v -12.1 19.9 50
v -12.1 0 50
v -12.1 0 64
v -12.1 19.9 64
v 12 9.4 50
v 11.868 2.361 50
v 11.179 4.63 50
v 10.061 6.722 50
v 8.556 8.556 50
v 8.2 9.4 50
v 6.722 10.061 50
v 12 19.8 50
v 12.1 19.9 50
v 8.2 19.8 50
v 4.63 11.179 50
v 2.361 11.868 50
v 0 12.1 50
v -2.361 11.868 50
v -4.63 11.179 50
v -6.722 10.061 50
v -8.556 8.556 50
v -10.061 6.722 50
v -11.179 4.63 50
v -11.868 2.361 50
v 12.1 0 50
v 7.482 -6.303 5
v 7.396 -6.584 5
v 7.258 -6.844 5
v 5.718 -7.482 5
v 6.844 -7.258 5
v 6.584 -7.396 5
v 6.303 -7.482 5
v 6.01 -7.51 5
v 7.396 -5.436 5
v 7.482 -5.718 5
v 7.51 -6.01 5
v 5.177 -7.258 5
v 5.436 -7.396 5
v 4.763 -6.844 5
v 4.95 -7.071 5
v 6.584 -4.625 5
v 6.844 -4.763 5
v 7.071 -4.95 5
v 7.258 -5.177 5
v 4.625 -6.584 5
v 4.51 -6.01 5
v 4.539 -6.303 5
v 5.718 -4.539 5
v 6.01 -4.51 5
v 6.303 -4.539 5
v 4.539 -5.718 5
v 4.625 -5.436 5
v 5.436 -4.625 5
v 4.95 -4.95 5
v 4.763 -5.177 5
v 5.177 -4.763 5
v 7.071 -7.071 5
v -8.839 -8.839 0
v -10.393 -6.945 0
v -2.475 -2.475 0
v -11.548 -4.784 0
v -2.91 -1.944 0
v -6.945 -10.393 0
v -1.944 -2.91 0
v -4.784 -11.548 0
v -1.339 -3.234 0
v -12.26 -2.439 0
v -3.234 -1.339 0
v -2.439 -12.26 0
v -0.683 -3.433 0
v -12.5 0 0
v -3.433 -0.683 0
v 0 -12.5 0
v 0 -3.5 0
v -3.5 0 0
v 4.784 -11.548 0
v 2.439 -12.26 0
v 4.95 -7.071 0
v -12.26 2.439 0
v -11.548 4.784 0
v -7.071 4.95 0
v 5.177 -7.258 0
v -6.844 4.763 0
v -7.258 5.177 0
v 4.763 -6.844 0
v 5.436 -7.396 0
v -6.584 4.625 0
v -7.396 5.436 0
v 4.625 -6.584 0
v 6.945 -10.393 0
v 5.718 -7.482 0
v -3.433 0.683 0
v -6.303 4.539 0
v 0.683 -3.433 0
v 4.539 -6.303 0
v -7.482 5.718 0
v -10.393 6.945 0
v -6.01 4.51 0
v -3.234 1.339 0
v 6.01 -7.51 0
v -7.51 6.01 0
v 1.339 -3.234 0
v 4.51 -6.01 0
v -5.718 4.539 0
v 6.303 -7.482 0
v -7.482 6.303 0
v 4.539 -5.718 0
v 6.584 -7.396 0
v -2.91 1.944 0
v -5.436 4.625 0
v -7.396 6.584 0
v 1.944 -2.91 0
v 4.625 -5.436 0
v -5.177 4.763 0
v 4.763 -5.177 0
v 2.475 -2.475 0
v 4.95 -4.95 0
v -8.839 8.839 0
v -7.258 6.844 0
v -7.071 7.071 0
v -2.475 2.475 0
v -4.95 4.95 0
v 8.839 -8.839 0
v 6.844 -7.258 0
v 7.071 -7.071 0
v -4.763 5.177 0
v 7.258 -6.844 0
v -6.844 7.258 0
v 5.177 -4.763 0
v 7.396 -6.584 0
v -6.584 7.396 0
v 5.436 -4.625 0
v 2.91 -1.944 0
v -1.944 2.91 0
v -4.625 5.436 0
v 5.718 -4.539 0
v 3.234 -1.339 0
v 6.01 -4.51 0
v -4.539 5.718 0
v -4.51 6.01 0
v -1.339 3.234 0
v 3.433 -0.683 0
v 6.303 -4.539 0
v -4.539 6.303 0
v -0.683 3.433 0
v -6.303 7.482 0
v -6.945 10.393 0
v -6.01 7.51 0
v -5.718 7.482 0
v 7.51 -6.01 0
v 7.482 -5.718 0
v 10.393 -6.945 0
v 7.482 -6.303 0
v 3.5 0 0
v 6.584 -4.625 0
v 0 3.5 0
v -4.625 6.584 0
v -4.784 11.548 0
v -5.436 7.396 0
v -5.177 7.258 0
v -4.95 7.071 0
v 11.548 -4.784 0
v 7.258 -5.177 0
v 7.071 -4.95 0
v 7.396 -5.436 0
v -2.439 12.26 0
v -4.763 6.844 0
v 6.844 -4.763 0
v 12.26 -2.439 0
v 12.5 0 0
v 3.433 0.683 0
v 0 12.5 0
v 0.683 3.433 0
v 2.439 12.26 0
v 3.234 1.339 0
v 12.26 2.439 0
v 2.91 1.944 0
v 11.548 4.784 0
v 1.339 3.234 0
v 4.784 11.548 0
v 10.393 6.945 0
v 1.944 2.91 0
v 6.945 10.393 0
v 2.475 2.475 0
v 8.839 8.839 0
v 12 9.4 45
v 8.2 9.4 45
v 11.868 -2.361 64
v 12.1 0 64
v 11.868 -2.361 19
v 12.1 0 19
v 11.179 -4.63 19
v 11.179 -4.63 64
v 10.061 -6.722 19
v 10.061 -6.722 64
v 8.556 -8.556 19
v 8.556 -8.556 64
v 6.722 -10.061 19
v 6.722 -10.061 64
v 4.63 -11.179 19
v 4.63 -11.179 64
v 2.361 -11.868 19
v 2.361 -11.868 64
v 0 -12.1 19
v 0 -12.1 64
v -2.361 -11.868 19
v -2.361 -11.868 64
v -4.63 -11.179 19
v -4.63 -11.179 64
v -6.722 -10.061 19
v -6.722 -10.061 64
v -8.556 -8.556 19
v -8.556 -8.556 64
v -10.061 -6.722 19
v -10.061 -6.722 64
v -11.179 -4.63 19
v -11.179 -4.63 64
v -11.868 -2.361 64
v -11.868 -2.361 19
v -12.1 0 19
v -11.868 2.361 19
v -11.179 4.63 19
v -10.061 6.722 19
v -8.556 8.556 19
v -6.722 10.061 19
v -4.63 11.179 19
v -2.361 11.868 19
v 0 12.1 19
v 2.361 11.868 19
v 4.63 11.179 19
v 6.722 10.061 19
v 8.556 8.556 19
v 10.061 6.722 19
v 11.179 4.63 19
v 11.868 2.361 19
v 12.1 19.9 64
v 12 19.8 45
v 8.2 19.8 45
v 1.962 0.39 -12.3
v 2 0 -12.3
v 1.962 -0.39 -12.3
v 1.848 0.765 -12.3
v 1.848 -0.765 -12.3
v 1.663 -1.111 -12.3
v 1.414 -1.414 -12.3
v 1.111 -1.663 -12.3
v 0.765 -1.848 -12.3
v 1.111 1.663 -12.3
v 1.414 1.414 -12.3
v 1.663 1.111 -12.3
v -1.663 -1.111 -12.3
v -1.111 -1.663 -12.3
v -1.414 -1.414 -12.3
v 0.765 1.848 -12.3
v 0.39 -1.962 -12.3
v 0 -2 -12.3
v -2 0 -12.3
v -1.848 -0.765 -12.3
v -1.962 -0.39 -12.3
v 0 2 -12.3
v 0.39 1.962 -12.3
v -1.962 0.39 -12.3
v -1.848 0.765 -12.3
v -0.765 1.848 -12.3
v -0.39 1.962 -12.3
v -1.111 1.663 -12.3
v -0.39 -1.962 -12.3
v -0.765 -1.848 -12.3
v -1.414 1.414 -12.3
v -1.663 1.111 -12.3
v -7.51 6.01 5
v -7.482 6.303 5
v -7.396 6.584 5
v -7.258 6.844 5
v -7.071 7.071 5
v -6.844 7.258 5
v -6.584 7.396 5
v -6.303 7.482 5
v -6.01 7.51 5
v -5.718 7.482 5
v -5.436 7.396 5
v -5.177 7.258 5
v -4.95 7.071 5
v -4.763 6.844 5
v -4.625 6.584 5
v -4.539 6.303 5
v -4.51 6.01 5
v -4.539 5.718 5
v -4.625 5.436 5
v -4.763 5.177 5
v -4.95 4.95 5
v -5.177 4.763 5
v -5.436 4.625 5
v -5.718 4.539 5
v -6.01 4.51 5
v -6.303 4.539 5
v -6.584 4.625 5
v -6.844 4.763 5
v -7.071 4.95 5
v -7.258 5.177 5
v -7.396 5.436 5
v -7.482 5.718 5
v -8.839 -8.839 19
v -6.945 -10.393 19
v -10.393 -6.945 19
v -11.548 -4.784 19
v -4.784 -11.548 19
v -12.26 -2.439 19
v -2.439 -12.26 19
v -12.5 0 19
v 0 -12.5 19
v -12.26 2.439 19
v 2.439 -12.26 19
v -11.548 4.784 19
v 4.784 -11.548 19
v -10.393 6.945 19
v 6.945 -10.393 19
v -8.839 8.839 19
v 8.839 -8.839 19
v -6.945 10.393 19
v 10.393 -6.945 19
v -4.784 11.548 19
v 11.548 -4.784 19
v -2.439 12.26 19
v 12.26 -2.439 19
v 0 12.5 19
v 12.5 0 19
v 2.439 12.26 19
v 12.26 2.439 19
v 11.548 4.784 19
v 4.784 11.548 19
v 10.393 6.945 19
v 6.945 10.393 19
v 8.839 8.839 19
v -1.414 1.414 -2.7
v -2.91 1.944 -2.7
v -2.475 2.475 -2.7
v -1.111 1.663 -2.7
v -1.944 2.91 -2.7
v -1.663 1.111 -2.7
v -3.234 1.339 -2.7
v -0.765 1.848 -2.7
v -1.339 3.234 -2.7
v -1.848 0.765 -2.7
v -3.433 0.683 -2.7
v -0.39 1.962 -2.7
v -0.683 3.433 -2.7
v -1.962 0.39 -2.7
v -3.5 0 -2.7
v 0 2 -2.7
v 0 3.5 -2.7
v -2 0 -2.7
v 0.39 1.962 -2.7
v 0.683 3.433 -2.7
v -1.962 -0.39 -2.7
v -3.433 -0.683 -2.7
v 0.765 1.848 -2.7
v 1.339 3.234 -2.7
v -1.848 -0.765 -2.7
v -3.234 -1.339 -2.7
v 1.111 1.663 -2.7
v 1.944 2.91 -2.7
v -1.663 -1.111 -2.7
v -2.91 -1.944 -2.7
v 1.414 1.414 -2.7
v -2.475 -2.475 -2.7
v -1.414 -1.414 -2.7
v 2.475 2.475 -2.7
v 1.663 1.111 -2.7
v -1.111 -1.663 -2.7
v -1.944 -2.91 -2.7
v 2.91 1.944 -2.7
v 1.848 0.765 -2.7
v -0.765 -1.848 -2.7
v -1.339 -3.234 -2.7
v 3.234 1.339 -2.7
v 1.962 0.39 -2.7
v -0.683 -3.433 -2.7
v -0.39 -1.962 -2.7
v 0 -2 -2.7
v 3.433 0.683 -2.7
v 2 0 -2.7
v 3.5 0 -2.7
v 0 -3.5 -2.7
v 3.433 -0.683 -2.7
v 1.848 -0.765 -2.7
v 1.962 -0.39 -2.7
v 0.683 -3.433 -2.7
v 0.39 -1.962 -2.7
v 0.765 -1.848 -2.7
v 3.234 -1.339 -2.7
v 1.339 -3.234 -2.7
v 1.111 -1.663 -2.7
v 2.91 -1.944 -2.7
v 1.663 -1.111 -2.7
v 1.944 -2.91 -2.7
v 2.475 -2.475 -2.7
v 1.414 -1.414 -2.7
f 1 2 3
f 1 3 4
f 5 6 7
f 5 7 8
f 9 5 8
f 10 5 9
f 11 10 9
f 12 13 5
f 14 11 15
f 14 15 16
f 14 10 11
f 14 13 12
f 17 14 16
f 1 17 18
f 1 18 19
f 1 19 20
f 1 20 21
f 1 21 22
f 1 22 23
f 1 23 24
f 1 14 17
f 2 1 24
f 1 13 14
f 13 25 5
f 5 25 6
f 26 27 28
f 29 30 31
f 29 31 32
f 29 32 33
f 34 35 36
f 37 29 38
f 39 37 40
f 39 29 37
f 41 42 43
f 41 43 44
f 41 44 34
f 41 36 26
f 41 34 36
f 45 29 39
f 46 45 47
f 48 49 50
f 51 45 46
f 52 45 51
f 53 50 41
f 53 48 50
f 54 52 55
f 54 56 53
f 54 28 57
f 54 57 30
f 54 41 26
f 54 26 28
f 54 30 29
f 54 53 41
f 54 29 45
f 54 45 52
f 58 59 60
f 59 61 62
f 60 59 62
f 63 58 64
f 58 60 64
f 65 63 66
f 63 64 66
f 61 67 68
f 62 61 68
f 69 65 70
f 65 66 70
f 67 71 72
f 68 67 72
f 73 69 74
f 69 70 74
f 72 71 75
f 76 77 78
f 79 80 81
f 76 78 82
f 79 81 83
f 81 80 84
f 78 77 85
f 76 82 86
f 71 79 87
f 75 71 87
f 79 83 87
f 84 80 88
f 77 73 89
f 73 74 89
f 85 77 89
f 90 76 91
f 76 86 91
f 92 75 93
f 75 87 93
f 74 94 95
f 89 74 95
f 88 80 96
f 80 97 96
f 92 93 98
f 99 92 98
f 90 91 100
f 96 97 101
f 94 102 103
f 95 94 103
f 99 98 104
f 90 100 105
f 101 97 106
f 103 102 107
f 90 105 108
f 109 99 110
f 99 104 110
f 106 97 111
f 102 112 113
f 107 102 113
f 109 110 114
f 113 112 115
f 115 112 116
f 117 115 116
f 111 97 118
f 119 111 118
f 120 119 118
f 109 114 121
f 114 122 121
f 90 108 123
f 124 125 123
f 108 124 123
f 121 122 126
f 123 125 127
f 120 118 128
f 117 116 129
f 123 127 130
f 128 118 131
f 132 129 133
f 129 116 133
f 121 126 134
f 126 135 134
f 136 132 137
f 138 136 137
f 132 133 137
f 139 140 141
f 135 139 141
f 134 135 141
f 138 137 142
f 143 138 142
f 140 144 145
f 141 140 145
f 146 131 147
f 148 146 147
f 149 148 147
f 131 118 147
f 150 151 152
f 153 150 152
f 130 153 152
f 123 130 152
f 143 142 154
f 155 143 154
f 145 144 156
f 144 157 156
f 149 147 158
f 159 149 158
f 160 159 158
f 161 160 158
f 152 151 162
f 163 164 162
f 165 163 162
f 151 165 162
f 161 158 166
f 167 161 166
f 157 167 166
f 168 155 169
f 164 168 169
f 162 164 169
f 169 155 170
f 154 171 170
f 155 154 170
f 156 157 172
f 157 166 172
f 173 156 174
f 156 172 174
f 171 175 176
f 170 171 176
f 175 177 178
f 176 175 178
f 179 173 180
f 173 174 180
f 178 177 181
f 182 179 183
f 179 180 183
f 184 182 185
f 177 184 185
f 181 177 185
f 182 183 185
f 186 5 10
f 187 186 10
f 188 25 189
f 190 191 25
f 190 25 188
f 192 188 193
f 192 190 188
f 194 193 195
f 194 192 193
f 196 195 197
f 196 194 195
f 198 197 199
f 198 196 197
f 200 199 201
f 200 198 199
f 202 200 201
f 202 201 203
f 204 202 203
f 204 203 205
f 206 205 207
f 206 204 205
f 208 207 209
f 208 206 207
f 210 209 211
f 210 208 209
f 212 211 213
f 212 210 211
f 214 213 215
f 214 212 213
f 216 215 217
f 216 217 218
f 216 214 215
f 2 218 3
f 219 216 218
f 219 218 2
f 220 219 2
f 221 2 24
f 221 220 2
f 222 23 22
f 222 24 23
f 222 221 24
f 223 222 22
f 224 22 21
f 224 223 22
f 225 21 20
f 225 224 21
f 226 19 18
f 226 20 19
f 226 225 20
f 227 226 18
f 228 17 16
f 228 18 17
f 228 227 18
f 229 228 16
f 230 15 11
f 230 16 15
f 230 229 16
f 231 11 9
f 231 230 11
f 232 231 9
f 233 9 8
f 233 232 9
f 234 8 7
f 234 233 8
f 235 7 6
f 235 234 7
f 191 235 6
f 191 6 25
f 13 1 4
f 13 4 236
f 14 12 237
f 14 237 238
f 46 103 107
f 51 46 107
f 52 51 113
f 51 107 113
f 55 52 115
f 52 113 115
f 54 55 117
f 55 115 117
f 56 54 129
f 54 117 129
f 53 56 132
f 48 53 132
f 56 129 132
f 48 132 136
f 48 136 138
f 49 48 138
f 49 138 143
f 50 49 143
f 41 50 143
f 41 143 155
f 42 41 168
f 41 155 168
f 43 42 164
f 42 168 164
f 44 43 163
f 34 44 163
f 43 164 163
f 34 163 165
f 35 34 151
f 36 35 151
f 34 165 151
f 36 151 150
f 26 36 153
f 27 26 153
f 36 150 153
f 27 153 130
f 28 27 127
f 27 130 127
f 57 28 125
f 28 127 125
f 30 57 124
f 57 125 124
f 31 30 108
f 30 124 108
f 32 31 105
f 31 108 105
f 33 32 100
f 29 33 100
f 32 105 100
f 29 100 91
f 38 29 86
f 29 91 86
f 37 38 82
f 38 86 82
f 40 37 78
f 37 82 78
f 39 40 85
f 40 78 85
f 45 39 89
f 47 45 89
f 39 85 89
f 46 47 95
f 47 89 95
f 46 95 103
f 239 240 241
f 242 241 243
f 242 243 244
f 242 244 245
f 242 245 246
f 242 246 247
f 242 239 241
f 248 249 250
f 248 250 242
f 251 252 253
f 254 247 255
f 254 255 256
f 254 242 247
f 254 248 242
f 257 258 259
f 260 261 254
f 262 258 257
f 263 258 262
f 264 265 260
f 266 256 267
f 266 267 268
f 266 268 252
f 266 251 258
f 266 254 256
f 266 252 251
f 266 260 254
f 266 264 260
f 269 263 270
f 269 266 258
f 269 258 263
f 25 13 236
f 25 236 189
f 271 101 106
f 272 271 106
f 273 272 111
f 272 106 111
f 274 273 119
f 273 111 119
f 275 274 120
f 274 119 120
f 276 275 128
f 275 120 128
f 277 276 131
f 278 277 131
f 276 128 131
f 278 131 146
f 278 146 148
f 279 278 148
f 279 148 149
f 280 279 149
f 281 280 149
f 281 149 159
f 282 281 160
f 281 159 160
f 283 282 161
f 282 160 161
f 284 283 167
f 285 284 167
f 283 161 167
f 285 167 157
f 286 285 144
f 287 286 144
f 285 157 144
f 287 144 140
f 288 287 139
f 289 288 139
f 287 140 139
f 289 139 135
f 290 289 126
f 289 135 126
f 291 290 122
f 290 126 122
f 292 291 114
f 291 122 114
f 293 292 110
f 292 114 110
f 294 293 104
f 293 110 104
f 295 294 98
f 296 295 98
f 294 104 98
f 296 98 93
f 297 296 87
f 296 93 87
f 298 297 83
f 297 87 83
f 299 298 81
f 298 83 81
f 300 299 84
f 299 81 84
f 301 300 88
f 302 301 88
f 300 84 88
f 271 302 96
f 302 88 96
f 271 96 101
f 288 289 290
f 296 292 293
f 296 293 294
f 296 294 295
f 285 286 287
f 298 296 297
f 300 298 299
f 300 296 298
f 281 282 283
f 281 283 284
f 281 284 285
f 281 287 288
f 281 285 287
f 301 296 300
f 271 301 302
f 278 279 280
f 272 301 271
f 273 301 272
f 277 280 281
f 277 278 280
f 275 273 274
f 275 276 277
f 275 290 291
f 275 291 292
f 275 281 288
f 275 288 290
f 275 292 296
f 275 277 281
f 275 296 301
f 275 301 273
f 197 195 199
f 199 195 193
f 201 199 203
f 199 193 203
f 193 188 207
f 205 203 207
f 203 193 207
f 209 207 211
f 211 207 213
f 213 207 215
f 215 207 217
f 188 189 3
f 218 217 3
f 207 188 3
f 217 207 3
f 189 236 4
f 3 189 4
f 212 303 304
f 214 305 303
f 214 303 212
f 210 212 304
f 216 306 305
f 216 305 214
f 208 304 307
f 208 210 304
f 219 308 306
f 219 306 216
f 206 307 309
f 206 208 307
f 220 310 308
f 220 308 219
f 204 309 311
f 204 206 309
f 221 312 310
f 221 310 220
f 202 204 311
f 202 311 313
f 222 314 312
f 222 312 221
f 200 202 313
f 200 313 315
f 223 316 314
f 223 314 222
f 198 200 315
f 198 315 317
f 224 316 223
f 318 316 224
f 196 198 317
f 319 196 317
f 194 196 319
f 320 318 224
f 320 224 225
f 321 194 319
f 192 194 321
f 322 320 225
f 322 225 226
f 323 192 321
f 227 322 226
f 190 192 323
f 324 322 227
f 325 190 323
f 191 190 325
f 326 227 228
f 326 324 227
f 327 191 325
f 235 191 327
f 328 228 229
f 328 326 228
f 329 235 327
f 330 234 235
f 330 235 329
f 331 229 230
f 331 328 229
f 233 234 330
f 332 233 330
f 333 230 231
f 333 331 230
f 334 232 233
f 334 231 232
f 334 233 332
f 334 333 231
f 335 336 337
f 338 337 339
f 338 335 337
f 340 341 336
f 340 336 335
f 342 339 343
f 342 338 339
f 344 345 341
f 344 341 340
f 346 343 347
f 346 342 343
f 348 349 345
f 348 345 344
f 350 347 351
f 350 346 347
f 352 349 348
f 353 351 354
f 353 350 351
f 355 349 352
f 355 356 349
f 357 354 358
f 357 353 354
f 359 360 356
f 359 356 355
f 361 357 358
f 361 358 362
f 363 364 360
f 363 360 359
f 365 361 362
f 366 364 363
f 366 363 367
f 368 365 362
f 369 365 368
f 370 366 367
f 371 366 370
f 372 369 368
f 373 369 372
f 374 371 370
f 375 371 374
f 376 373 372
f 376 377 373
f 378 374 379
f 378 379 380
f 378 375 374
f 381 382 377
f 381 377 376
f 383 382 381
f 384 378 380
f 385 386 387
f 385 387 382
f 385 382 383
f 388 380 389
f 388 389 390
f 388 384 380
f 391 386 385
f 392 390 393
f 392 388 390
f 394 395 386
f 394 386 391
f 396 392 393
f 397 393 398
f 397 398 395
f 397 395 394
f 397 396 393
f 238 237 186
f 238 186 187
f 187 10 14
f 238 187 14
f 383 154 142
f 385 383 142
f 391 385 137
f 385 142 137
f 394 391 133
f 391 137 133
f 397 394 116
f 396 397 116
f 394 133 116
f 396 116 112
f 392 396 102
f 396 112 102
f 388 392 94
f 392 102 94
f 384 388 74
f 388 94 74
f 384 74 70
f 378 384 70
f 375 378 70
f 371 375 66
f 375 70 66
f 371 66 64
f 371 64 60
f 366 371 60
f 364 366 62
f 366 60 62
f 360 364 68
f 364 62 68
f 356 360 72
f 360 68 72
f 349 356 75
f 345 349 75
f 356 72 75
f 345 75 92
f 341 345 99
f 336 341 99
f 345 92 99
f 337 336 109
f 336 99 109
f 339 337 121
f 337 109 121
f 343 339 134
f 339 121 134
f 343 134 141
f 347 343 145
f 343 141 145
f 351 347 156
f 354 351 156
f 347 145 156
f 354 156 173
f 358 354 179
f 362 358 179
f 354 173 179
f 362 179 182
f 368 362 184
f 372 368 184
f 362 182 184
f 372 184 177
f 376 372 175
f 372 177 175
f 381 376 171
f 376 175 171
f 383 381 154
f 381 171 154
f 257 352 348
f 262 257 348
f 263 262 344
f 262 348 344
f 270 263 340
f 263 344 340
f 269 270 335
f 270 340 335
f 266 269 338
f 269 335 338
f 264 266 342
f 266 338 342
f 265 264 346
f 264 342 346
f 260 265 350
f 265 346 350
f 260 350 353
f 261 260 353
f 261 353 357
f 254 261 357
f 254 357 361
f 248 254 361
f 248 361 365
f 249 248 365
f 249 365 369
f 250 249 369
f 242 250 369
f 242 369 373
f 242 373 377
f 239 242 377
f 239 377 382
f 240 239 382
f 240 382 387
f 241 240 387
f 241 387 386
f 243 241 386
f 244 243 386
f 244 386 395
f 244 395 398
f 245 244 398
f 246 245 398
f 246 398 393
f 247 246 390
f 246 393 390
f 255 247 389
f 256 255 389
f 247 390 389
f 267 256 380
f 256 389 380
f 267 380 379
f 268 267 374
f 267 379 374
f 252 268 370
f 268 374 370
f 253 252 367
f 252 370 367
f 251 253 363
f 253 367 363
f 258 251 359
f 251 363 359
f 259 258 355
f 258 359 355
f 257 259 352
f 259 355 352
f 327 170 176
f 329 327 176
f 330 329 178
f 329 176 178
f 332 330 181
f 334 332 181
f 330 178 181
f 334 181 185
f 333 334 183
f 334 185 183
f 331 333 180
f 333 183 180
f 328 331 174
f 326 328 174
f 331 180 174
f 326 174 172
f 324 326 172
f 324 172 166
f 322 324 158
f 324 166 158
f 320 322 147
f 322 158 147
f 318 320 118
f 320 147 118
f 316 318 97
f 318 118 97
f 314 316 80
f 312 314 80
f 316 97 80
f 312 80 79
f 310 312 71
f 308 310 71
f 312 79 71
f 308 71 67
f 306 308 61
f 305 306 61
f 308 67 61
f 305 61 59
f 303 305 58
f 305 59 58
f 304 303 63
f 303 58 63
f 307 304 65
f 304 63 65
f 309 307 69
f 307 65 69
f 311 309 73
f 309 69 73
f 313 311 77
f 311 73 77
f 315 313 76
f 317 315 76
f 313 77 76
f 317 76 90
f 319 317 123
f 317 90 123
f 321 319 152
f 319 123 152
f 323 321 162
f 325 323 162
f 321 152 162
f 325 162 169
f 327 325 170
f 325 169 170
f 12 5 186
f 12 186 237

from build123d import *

# Parameters (mm, degrees)
SKETCH1_R           = 12.5
BOSS_EXTRUDE1_DEPTH = 19
SKETCH2_R           = 12.1
BOSS_EXTRUDE2_DEPTH = 31
BOSS_EXTRUDE3_DEPTH = 14
SKETCH4_W           = 3.8
SKETCH4_H           = 10.4
BOSS_EXTRUDE4_DEPTH = 5
SKETCH5_R           = 3.5
BOSS_EXTRUDE5_DEPTH = 2.7
SKETCH6_R           = 2
BOSS_EXTRUDE6_DEPTH = 12.3
SKETCH7_R           = 1.5
CUT_EXTRUDE1_DEPTH  = 5


with BuildPart() as part:
    # Sketch1 → Boss-Extrude1 (new body)
    with BuildSketch(Plane.XY):
        Circle(SKETCH1_R)
    extrude(amount=BOSS_EXTRUDE1_DEPTH)

    # Sketch2 → Boss-Extrude2 (add)
    with BuildSketch(Plane.XY.offset(19)):
        Circle(SKETCH2_R)
    extrude(amount=BOSS_EXTRUDE2_DEPTH)

    # Sketch3 → Boss-Extrude3 (add)
    with BuildSketch(Plane.XY.offset(50)):
        with BuildLine():
            Line((-12.1, 0), (-12.1, 19.9))
            Line((-12.1, 19.9), (12.1, 19.9))
            Line((12.1, 19.9), (12.1, 0))
            ThreePointArc((12.1, 0), (0, -12.1), (-12.1, 0))
        make_face()
    extrude(amount=BOSS_EXTRUDE3_DEPTH)

    # Sketch4 → Boss-Extrude4 (add)
    with BuildSketch(Plane(origin=(0, 0, 50), x_dir=(-1, 0, 0), z_dir=(0, 0, -1))):
        with Locations((-10.1, 14.6)):
            Rectangle(SKETCH4_W, SKETCH4_H)
    extrude(amount=BOSS_EXTRUDE4_DEPTH)

    # Sketch5 → Boss-Extrude5 (add)
    with BuildSketch(Plane(origin=(0, 0, 0), x_dir=(-1, 0, 0), z_dir=(0, 0, -1))):
        with Locations(Location((0, 0, 0), (0, 0, 180))):
            Circle(SKETCH5_R)
    extrude(amount=BOSS_EXTRUDE5_DEPTH)

    # Sketch6 → Boss-Extrude6 (add)
    with BuildSketch(Plane(origin=(0, 0, 0), x_dir=(-1, 0, 0), z_dir=(0, 0, -1))):
        Circle(SKETCH6_R)
    extrude(amount=BOSS_EXTRUDE6_DEPTH)

    # Sketch7 → Cut-Extrude1 (cut)
    with BuildSketch(Plane(origin=(0, 0, 0), x_dir=(-1, 0, 0), z_dir=(0, 0, -1))):
        with Locations((6.01040764, 6.01040764)):
            Circle(SKETCH7_R)
        with Locations((-6.01040764, -6.01040764)):
            Circle(SKETCH7_R)
    extrude(amount=-CUT_EXTRUDE1_DEPTH, mode=Mode.SUBTRACT)


solid = part.part
